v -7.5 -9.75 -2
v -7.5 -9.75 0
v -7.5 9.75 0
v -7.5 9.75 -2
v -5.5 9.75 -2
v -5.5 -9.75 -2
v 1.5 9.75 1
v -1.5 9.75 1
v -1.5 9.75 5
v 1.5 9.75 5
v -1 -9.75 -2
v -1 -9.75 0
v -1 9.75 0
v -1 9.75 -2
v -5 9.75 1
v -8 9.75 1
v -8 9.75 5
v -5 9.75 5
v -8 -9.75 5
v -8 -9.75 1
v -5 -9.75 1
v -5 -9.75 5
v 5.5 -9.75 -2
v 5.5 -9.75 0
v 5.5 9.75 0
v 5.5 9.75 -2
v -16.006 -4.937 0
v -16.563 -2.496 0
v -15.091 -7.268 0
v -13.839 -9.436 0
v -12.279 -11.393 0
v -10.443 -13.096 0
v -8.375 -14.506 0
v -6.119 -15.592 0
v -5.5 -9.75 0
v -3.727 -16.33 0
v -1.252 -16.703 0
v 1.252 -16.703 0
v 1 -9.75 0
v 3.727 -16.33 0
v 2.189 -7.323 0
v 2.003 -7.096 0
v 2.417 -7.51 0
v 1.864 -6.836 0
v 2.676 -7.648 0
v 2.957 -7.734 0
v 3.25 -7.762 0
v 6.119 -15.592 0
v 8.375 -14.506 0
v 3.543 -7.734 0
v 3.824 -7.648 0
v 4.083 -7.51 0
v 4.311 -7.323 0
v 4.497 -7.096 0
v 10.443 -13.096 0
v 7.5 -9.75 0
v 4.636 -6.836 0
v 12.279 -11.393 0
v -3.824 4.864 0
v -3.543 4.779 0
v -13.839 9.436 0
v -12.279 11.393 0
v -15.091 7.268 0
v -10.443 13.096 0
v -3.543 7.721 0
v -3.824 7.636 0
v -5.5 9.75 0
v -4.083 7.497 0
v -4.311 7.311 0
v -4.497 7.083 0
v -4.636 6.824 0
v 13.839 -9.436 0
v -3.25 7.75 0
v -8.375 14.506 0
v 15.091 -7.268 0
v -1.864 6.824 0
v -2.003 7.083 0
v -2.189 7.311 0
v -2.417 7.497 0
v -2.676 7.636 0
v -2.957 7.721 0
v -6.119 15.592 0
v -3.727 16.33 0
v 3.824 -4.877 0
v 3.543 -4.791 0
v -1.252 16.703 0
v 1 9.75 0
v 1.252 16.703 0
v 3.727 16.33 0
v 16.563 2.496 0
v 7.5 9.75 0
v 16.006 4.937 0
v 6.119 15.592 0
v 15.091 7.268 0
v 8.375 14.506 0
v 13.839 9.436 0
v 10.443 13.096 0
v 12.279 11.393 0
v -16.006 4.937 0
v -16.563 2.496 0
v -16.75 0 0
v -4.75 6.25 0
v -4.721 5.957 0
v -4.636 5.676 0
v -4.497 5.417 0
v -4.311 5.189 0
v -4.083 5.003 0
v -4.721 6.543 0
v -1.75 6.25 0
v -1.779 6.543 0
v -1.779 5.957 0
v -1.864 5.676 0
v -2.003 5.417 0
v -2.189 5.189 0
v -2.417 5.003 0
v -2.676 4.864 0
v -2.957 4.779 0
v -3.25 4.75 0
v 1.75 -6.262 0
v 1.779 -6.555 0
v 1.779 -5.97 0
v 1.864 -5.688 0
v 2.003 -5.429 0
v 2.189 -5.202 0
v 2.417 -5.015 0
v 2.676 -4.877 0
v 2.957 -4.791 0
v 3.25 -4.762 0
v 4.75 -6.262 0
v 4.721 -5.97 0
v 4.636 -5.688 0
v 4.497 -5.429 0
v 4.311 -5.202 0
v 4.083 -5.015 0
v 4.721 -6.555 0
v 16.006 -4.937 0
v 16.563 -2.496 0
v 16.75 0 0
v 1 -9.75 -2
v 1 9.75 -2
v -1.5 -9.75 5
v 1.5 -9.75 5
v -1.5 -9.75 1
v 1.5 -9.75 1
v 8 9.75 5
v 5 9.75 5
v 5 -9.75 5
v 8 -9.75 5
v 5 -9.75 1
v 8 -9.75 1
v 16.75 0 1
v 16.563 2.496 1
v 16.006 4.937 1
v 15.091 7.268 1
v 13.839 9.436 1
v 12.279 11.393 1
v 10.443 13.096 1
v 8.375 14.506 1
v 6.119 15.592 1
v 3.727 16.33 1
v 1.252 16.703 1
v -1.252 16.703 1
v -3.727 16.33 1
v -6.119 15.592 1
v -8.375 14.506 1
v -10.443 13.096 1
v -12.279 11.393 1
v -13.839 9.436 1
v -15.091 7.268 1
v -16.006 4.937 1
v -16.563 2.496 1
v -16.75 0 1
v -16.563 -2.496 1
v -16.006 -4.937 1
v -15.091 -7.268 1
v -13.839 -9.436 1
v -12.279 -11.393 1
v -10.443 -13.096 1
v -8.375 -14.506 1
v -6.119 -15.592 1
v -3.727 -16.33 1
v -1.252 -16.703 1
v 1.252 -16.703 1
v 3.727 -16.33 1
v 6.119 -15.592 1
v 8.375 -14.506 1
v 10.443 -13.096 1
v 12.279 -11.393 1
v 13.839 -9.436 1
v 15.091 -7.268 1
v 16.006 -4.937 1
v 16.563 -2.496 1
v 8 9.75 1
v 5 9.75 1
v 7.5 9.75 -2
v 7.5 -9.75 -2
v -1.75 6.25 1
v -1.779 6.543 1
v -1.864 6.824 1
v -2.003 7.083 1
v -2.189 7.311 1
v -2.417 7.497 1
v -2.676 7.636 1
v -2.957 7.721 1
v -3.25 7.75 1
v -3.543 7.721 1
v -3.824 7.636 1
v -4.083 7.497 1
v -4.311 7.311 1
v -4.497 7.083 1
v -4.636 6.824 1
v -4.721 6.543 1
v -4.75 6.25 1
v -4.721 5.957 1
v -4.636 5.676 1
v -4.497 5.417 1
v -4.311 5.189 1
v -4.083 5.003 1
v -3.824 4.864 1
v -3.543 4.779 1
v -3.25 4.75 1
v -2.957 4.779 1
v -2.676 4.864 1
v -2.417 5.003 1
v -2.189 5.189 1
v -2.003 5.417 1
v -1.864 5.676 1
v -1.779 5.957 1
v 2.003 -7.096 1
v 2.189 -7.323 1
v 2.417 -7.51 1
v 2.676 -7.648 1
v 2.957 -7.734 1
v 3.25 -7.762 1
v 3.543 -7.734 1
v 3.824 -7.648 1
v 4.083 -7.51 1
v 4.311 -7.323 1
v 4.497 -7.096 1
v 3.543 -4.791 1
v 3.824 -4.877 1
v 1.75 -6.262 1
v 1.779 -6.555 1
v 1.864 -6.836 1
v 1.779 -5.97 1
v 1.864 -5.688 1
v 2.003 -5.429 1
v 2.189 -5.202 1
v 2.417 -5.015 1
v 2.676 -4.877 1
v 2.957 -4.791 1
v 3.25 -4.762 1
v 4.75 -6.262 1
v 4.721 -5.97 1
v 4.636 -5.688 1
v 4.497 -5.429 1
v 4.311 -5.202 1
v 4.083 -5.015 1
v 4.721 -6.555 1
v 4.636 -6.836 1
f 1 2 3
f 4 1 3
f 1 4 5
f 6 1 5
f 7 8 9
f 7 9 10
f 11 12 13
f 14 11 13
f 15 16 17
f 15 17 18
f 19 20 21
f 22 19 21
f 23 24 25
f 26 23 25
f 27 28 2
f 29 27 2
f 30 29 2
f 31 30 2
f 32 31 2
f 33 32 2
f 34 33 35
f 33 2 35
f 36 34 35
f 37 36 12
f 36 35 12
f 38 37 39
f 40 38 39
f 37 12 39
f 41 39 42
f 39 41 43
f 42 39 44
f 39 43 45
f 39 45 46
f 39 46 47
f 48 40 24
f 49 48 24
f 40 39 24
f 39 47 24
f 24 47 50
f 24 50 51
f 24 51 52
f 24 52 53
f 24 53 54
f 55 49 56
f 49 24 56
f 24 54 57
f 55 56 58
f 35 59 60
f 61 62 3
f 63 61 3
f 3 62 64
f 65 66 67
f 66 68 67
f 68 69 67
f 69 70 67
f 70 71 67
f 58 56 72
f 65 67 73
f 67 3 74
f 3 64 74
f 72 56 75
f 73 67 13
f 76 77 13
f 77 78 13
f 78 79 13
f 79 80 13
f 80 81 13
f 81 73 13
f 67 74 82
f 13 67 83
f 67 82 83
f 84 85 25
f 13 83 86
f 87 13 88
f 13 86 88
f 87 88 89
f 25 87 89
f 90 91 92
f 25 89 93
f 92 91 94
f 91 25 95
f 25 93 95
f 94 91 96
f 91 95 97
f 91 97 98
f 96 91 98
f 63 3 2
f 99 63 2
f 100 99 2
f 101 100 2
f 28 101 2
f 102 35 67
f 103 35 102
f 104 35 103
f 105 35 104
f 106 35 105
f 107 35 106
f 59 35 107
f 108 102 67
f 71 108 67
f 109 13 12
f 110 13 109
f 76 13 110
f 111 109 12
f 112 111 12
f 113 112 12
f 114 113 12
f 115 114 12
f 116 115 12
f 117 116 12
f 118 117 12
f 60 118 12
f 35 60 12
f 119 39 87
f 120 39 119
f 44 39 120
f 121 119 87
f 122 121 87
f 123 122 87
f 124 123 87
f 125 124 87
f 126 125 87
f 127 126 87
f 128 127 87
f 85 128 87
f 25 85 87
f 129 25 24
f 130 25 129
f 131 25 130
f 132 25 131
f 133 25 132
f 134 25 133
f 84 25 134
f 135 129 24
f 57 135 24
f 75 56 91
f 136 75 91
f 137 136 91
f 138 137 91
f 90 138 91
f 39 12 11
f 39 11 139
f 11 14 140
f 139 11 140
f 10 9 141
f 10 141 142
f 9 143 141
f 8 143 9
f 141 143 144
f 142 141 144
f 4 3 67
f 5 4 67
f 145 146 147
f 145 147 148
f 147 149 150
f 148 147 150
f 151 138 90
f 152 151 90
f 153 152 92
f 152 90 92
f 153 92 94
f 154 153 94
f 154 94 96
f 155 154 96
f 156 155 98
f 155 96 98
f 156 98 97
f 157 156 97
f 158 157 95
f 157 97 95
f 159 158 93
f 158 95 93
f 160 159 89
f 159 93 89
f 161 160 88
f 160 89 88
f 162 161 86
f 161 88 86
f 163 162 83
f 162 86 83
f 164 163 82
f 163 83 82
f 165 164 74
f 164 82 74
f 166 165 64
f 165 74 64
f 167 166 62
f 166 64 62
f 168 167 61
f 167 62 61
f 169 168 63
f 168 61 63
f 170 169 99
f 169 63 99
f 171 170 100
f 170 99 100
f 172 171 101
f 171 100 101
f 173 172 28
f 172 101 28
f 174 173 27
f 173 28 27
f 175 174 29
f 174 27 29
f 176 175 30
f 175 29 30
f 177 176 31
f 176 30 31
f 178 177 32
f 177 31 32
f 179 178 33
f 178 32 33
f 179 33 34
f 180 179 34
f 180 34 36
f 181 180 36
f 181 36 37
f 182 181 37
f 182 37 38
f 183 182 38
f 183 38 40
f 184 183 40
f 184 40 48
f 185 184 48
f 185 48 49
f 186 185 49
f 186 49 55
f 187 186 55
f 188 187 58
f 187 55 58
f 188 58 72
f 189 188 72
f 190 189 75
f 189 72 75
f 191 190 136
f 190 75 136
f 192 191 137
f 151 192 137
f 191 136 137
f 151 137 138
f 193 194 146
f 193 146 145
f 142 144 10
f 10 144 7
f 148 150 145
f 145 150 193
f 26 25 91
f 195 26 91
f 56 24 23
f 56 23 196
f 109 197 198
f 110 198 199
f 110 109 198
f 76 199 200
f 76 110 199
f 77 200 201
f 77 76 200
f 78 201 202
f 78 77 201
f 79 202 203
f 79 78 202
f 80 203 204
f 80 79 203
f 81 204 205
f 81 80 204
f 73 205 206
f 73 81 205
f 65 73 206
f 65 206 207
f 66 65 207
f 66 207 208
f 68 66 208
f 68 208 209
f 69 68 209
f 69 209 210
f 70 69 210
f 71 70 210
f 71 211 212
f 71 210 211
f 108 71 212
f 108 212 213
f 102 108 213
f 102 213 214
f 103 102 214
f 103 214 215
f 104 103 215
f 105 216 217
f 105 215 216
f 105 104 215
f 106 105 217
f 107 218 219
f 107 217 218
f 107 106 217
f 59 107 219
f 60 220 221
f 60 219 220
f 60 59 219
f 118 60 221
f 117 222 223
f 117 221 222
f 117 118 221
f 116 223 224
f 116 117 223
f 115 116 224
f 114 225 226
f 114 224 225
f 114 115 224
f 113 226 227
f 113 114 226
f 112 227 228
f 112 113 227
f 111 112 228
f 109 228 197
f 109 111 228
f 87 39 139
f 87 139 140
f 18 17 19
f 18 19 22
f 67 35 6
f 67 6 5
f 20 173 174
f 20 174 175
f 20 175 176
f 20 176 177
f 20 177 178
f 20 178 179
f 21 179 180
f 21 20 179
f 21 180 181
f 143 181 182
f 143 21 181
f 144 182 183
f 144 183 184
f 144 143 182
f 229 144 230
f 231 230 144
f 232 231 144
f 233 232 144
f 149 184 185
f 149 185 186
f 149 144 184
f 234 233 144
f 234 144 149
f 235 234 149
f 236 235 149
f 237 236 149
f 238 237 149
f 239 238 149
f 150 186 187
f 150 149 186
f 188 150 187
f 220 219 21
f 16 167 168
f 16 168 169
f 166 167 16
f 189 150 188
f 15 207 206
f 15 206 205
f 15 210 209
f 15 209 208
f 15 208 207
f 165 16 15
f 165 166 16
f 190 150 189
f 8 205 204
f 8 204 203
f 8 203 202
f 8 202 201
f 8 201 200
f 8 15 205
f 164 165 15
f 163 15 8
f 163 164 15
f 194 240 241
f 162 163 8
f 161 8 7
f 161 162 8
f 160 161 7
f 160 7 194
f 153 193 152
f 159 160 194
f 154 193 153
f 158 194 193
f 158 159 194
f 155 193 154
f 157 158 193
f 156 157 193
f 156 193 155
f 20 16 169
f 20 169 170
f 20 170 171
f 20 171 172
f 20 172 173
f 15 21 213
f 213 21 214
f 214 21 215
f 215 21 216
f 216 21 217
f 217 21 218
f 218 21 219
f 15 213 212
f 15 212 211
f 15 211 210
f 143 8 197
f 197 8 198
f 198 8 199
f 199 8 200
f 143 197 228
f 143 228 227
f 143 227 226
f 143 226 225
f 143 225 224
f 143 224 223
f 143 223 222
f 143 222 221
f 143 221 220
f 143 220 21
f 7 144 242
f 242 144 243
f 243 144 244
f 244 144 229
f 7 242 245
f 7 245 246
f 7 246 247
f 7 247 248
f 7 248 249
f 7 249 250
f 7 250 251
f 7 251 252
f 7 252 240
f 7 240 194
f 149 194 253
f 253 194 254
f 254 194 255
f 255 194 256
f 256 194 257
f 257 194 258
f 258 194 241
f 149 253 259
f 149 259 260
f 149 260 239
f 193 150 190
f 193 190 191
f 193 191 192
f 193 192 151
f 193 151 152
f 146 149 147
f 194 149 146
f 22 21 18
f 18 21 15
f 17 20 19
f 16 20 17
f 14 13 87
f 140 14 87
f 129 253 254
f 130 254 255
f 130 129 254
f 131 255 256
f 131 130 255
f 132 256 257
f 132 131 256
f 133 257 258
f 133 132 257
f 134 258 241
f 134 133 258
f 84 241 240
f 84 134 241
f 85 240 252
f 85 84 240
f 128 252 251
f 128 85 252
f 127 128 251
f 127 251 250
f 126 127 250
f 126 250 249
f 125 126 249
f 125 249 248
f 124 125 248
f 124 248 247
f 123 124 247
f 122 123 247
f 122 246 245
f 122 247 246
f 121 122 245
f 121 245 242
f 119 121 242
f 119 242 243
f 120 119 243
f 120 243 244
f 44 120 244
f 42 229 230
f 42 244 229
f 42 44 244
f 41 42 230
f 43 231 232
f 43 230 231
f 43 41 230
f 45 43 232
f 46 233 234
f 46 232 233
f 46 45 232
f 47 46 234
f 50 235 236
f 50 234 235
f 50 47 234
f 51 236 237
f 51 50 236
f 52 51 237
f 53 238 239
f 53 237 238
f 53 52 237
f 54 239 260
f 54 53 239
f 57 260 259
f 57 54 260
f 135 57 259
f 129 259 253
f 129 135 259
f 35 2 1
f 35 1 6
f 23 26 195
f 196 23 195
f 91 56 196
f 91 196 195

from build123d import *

# Parameters (mm, degrees)
SKETCH1_R          = 16.75
EXTRUDE1_DEPTH     = 1
SKETCH3_W          = 3
SKETCH3_H          = 19.5
EXTRUDE4_DEPTH     = 4
SKETCH4_W          = 2
SKETCH4_H          = 19.5
EXTRUDE5_DEPTH     = 2
SKETCH5_R          = 1.5
CUT_EXTRUDE1_DEPTH = 2


with BuildPart() as part:
    # Sketch1 → Extrude1 (new body)
    with BuildSketch(Plane.XY):
        Circle(SKETCH1_R)
    extrude(amount=EXTRUDE1_DEPTH)

    # Sketch3 → Extrude4 (add)
    with BuildSketch(Plane.XY.offset(1)):
        with Locations((6.5, 0)):
            Rectangle(SKETCH3_W, SKETCH3_H)
        Rectangle(SKETCH3_W, SKETCH3_H)
        with Locations((-6.5, 0)):
            Rectangle(SKETCH3_W, SKETCH3_H)
    extrude(amount=EXTRUDE4_DEPTH)

    # Sketch4 → Extrude5 (add)
    with BuildSketch(Plane.XY):
        with Locations((6.5, 0)):
            Rectangle(SKETCH4_W, SKETCH4_H)
        with Locations((-6.5, 0)):
            Rectangle(SKETCH4_W, SKETCH4_H)
        Rectangle(SKETCH4_W, SKETCH4_H)
    extrude(amount=-EXTRUDE5_DEPTH)

    # Sketch5 → Cut-Extrude1 (cut)
    with BuildSketch(Plane.XY):
        with Locations((-3.25, 6.25)):
            Circle(SKETCH5_R)
        with Locations((3.25, -6.262393856)):
            Circle(SKETCH5_R)
    extrude(amount=CUT_EXTRUDE1_DEPTH, mode=Mode.SUBTRACT)


solid = part.part
